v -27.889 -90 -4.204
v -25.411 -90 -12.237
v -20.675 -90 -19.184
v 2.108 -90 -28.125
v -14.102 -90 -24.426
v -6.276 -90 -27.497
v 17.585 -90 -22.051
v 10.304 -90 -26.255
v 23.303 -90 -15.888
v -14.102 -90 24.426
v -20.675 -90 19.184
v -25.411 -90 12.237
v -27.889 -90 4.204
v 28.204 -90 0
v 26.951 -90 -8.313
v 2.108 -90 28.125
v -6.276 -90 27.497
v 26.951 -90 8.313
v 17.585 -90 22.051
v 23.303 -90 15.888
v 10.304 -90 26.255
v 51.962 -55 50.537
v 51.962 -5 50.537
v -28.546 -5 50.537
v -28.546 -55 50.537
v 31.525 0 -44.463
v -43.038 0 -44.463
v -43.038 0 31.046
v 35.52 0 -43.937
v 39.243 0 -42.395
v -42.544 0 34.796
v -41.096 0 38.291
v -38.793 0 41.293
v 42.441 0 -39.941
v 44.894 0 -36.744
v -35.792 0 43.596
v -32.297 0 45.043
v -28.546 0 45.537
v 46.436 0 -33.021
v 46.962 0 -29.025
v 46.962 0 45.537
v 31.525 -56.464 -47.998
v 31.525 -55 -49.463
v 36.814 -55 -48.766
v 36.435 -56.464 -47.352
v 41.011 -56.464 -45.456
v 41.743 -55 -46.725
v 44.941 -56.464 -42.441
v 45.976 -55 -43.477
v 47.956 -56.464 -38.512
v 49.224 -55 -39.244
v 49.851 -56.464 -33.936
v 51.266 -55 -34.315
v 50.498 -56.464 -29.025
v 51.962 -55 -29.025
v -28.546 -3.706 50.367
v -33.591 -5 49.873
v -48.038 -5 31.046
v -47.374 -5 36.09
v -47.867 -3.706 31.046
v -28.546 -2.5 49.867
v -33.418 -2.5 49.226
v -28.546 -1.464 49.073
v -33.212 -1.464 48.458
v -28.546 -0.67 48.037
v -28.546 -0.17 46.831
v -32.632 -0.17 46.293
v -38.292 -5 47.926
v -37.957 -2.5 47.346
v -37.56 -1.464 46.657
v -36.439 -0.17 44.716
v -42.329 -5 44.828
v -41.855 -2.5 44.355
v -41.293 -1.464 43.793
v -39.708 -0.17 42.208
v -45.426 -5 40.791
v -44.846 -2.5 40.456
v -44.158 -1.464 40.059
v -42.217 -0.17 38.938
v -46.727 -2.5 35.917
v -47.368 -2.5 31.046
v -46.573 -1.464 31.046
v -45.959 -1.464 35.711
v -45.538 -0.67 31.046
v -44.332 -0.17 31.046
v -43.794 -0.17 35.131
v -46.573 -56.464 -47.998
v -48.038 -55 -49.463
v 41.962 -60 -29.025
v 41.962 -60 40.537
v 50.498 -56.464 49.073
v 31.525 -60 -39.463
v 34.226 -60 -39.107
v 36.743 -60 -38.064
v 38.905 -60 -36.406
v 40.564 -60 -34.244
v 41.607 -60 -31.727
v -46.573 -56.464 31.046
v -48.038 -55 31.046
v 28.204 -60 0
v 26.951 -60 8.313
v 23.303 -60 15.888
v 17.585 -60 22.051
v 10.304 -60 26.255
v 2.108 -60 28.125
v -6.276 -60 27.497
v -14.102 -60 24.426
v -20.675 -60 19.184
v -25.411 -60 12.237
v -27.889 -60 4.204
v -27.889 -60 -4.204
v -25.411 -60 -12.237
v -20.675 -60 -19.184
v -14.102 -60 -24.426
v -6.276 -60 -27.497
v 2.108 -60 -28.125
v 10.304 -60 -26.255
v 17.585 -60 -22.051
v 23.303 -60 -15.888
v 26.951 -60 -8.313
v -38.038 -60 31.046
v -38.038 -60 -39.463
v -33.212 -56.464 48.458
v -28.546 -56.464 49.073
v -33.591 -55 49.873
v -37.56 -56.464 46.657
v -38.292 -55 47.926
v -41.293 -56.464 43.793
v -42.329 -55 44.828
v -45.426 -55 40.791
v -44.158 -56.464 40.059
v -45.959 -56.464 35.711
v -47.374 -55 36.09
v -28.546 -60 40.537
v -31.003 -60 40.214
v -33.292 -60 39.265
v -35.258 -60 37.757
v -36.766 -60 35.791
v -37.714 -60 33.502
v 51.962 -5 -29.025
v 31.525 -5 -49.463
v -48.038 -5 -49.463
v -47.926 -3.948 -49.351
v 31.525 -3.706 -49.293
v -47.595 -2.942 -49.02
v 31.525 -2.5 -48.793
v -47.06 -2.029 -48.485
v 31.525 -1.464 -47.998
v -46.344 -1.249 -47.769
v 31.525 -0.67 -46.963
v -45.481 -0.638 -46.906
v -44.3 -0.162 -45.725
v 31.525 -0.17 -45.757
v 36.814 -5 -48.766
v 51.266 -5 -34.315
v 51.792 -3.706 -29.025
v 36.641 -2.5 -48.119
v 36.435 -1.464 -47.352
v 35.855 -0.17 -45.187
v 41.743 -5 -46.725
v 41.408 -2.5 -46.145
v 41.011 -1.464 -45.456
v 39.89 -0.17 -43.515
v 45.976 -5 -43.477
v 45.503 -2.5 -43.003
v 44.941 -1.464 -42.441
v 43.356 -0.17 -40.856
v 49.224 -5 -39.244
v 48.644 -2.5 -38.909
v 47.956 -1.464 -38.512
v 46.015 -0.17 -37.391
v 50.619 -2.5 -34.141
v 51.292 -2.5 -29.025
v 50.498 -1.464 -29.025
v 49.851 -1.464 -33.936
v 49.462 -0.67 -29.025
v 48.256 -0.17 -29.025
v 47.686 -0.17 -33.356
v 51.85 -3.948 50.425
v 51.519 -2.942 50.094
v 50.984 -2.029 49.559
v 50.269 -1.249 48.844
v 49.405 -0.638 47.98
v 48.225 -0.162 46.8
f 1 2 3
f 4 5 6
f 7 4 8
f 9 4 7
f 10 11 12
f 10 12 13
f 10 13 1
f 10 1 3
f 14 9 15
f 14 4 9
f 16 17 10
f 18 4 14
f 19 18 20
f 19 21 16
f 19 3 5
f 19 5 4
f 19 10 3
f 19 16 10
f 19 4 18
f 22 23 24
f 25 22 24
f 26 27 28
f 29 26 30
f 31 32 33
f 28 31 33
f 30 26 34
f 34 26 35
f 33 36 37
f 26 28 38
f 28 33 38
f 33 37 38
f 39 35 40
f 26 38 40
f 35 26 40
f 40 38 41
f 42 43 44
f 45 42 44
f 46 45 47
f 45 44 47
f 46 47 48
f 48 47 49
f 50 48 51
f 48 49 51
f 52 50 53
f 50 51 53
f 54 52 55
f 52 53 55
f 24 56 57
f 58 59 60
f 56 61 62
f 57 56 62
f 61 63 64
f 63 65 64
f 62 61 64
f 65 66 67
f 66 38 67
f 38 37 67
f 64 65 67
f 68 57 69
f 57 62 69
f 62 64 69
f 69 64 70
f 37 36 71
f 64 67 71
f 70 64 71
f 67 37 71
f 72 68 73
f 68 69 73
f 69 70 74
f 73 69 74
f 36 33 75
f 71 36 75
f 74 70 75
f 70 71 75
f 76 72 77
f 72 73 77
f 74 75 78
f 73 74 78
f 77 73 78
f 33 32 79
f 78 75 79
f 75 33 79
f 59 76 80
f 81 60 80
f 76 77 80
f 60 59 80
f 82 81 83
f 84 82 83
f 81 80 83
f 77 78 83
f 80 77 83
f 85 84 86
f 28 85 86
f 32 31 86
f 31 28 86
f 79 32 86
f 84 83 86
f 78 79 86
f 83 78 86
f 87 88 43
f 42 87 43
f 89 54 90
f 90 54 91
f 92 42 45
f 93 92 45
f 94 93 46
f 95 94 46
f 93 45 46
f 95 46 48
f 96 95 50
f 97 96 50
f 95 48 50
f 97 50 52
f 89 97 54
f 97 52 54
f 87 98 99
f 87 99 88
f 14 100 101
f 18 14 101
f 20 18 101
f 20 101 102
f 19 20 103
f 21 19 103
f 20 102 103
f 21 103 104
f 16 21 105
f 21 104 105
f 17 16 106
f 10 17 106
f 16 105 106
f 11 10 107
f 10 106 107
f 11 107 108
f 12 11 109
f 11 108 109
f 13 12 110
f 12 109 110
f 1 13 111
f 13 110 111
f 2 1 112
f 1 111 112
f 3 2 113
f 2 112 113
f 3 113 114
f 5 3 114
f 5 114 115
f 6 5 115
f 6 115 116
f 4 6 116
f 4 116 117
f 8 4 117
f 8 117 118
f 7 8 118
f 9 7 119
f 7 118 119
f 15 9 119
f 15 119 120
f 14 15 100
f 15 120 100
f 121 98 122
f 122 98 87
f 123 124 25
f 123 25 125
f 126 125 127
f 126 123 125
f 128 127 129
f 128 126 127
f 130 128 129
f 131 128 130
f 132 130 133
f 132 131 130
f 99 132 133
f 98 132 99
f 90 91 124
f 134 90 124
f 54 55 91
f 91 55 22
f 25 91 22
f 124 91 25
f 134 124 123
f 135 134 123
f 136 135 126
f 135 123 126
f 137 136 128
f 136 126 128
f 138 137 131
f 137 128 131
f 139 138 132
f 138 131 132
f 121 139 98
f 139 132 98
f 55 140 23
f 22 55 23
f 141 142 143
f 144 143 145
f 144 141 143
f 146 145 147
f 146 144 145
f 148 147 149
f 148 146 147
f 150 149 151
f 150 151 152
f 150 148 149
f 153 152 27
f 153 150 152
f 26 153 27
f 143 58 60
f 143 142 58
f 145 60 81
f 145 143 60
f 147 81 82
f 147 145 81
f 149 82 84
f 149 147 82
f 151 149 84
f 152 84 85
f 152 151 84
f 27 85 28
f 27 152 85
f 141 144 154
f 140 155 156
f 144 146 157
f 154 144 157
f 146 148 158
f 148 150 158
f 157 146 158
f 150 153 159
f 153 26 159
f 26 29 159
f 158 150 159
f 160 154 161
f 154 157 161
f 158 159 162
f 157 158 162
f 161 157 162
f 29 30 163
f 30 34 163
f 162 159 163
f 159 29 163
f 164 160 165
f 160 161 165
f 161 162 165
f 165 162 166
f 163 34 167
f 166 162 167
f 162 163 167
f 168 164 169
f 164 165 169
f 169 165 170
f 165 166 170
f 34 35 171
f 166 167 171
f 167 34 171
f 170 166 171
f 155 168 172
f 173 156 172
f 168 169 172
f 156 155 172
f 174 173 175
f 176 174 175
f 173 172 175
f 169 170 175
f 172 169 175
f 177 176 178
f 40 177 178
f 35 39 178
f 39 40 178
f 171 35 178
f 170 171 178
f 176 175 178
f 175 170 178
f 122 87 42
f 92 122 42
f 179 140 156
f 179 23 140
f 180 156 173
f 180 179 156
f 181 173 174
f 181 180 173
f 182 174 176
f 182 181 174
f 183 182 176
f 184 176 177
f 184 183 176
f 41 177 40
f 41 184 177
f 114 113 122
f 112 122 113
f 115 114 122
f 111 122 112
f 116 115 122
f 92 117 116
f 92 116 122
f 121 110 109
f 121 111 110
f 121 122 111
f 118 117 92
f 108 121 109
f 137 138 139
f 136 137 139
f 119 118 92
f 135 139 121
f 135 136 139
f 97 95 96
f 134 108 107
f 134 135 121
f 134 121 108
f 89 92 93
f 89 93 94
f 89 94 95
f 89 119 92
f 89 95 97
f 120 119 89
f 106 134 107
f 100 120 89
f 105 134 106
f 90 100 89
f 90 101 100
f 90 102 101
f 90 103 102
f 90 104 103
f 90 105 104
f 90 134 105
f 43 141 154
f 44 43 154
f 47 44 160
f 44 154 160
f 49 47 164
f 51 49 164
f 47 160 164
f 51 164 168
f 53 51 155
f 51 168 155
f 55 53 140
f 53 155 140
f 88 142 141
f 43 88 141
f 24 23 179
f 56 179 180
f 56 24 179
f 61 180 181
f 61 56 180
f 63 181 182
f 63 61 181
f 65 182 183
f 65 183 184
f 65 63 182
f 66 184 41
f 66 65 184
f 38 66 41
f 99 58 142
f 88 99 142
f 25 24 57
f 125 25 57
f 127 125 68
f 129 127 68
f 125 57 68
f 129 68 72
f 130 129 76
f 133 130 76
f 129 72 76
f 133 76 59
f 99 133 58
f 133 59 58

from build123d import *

# Parameters (mm, degrees)
F1_DEPTH = 60
F2_R     = 5
F3_SIZE  = 5
F4_SIZE  = 5
F5_R     = 28.204224
F6_DEPTH = 30


with BuildPart() as f1:
    # F0 (on Front) → F1 (new body)
    with BuildSketch(Plane.XZ):
        with BuildLine():
            Line((31.411576, 50.537112), (-28.546256, 50.537112))
            ThreePointArc((-28.546256, 50.537112), (-42.32879, 44.828199), (-48.037703, 31.045665))
            Line((-48.037703, 31.045665), (-48.037703, -49.462888))
            Line((-48.037703, -49.462888), (31.524516, -49.462888))
            ThreePointArc((31.524516, -49.462888), (45.97621, -43.476801), (51.962297, -29.025107))
            Line((51.962297, -29.025107), (51.962297, 29.986391))
            Line((51.962297, 29.986391), (51.962297, 50.537112))
            Line((51.962297, 50.537112), (31.411576, 50.537112))
        make_face()
    extrude(amount=F1_DEPTH)

    # F2
    f2_edges = [f1.edges().sort_by_distance(p)[0] for p in [
        (-42.32879, 0, 44.828199),
        (-48.037703, 0, -9.208612),
        (-8.256593, 0, -49.462888),
        (45.97621, 0, -43.476801),
        (51.962297, 0, 10.756002),
        (11.708021, 0, 50.537112),
    ]]
    fillet(f2_edges, radius=F2_R)

    # F3
    f3_edges = [f1.edges().sort_by_distance(p)[0] for p in [
        (11.708021, -60, 50.537112),
        (-42.32879, -60, 44.828199),
        (-48.037703, -60, -9.208612),
        (-8.256593, -60, -49.462888),
        (45.97621, -60, -43.476801),
        (51.962297, -60, 10.756002),
    ]]
    chamfer(f3_edges, length=F3_SIZE)

    # F4
    f4_edges = [f1.edges().sort_by_distance(p)[0] for p in [
        (-43.037703, -60, -6.708612),
        (-5.756593, -60, -44.462888),
        (-38.793256, -60, 41.292665),
        (42.440676, -60, -39.941267),
        (9.208021, -60, 45.537112),
        (46.962297, -60, 8.256002),
    ]]
    chamfer(f4_edges, length=F4_SIZE)

    # F5 (on face) → F6 (join)
    with BuildSketch(Plane.XZ.offset(60)):
        Circle(F5_R)
    extrude(amount=F6_DEPTH)


solid = f1.part
